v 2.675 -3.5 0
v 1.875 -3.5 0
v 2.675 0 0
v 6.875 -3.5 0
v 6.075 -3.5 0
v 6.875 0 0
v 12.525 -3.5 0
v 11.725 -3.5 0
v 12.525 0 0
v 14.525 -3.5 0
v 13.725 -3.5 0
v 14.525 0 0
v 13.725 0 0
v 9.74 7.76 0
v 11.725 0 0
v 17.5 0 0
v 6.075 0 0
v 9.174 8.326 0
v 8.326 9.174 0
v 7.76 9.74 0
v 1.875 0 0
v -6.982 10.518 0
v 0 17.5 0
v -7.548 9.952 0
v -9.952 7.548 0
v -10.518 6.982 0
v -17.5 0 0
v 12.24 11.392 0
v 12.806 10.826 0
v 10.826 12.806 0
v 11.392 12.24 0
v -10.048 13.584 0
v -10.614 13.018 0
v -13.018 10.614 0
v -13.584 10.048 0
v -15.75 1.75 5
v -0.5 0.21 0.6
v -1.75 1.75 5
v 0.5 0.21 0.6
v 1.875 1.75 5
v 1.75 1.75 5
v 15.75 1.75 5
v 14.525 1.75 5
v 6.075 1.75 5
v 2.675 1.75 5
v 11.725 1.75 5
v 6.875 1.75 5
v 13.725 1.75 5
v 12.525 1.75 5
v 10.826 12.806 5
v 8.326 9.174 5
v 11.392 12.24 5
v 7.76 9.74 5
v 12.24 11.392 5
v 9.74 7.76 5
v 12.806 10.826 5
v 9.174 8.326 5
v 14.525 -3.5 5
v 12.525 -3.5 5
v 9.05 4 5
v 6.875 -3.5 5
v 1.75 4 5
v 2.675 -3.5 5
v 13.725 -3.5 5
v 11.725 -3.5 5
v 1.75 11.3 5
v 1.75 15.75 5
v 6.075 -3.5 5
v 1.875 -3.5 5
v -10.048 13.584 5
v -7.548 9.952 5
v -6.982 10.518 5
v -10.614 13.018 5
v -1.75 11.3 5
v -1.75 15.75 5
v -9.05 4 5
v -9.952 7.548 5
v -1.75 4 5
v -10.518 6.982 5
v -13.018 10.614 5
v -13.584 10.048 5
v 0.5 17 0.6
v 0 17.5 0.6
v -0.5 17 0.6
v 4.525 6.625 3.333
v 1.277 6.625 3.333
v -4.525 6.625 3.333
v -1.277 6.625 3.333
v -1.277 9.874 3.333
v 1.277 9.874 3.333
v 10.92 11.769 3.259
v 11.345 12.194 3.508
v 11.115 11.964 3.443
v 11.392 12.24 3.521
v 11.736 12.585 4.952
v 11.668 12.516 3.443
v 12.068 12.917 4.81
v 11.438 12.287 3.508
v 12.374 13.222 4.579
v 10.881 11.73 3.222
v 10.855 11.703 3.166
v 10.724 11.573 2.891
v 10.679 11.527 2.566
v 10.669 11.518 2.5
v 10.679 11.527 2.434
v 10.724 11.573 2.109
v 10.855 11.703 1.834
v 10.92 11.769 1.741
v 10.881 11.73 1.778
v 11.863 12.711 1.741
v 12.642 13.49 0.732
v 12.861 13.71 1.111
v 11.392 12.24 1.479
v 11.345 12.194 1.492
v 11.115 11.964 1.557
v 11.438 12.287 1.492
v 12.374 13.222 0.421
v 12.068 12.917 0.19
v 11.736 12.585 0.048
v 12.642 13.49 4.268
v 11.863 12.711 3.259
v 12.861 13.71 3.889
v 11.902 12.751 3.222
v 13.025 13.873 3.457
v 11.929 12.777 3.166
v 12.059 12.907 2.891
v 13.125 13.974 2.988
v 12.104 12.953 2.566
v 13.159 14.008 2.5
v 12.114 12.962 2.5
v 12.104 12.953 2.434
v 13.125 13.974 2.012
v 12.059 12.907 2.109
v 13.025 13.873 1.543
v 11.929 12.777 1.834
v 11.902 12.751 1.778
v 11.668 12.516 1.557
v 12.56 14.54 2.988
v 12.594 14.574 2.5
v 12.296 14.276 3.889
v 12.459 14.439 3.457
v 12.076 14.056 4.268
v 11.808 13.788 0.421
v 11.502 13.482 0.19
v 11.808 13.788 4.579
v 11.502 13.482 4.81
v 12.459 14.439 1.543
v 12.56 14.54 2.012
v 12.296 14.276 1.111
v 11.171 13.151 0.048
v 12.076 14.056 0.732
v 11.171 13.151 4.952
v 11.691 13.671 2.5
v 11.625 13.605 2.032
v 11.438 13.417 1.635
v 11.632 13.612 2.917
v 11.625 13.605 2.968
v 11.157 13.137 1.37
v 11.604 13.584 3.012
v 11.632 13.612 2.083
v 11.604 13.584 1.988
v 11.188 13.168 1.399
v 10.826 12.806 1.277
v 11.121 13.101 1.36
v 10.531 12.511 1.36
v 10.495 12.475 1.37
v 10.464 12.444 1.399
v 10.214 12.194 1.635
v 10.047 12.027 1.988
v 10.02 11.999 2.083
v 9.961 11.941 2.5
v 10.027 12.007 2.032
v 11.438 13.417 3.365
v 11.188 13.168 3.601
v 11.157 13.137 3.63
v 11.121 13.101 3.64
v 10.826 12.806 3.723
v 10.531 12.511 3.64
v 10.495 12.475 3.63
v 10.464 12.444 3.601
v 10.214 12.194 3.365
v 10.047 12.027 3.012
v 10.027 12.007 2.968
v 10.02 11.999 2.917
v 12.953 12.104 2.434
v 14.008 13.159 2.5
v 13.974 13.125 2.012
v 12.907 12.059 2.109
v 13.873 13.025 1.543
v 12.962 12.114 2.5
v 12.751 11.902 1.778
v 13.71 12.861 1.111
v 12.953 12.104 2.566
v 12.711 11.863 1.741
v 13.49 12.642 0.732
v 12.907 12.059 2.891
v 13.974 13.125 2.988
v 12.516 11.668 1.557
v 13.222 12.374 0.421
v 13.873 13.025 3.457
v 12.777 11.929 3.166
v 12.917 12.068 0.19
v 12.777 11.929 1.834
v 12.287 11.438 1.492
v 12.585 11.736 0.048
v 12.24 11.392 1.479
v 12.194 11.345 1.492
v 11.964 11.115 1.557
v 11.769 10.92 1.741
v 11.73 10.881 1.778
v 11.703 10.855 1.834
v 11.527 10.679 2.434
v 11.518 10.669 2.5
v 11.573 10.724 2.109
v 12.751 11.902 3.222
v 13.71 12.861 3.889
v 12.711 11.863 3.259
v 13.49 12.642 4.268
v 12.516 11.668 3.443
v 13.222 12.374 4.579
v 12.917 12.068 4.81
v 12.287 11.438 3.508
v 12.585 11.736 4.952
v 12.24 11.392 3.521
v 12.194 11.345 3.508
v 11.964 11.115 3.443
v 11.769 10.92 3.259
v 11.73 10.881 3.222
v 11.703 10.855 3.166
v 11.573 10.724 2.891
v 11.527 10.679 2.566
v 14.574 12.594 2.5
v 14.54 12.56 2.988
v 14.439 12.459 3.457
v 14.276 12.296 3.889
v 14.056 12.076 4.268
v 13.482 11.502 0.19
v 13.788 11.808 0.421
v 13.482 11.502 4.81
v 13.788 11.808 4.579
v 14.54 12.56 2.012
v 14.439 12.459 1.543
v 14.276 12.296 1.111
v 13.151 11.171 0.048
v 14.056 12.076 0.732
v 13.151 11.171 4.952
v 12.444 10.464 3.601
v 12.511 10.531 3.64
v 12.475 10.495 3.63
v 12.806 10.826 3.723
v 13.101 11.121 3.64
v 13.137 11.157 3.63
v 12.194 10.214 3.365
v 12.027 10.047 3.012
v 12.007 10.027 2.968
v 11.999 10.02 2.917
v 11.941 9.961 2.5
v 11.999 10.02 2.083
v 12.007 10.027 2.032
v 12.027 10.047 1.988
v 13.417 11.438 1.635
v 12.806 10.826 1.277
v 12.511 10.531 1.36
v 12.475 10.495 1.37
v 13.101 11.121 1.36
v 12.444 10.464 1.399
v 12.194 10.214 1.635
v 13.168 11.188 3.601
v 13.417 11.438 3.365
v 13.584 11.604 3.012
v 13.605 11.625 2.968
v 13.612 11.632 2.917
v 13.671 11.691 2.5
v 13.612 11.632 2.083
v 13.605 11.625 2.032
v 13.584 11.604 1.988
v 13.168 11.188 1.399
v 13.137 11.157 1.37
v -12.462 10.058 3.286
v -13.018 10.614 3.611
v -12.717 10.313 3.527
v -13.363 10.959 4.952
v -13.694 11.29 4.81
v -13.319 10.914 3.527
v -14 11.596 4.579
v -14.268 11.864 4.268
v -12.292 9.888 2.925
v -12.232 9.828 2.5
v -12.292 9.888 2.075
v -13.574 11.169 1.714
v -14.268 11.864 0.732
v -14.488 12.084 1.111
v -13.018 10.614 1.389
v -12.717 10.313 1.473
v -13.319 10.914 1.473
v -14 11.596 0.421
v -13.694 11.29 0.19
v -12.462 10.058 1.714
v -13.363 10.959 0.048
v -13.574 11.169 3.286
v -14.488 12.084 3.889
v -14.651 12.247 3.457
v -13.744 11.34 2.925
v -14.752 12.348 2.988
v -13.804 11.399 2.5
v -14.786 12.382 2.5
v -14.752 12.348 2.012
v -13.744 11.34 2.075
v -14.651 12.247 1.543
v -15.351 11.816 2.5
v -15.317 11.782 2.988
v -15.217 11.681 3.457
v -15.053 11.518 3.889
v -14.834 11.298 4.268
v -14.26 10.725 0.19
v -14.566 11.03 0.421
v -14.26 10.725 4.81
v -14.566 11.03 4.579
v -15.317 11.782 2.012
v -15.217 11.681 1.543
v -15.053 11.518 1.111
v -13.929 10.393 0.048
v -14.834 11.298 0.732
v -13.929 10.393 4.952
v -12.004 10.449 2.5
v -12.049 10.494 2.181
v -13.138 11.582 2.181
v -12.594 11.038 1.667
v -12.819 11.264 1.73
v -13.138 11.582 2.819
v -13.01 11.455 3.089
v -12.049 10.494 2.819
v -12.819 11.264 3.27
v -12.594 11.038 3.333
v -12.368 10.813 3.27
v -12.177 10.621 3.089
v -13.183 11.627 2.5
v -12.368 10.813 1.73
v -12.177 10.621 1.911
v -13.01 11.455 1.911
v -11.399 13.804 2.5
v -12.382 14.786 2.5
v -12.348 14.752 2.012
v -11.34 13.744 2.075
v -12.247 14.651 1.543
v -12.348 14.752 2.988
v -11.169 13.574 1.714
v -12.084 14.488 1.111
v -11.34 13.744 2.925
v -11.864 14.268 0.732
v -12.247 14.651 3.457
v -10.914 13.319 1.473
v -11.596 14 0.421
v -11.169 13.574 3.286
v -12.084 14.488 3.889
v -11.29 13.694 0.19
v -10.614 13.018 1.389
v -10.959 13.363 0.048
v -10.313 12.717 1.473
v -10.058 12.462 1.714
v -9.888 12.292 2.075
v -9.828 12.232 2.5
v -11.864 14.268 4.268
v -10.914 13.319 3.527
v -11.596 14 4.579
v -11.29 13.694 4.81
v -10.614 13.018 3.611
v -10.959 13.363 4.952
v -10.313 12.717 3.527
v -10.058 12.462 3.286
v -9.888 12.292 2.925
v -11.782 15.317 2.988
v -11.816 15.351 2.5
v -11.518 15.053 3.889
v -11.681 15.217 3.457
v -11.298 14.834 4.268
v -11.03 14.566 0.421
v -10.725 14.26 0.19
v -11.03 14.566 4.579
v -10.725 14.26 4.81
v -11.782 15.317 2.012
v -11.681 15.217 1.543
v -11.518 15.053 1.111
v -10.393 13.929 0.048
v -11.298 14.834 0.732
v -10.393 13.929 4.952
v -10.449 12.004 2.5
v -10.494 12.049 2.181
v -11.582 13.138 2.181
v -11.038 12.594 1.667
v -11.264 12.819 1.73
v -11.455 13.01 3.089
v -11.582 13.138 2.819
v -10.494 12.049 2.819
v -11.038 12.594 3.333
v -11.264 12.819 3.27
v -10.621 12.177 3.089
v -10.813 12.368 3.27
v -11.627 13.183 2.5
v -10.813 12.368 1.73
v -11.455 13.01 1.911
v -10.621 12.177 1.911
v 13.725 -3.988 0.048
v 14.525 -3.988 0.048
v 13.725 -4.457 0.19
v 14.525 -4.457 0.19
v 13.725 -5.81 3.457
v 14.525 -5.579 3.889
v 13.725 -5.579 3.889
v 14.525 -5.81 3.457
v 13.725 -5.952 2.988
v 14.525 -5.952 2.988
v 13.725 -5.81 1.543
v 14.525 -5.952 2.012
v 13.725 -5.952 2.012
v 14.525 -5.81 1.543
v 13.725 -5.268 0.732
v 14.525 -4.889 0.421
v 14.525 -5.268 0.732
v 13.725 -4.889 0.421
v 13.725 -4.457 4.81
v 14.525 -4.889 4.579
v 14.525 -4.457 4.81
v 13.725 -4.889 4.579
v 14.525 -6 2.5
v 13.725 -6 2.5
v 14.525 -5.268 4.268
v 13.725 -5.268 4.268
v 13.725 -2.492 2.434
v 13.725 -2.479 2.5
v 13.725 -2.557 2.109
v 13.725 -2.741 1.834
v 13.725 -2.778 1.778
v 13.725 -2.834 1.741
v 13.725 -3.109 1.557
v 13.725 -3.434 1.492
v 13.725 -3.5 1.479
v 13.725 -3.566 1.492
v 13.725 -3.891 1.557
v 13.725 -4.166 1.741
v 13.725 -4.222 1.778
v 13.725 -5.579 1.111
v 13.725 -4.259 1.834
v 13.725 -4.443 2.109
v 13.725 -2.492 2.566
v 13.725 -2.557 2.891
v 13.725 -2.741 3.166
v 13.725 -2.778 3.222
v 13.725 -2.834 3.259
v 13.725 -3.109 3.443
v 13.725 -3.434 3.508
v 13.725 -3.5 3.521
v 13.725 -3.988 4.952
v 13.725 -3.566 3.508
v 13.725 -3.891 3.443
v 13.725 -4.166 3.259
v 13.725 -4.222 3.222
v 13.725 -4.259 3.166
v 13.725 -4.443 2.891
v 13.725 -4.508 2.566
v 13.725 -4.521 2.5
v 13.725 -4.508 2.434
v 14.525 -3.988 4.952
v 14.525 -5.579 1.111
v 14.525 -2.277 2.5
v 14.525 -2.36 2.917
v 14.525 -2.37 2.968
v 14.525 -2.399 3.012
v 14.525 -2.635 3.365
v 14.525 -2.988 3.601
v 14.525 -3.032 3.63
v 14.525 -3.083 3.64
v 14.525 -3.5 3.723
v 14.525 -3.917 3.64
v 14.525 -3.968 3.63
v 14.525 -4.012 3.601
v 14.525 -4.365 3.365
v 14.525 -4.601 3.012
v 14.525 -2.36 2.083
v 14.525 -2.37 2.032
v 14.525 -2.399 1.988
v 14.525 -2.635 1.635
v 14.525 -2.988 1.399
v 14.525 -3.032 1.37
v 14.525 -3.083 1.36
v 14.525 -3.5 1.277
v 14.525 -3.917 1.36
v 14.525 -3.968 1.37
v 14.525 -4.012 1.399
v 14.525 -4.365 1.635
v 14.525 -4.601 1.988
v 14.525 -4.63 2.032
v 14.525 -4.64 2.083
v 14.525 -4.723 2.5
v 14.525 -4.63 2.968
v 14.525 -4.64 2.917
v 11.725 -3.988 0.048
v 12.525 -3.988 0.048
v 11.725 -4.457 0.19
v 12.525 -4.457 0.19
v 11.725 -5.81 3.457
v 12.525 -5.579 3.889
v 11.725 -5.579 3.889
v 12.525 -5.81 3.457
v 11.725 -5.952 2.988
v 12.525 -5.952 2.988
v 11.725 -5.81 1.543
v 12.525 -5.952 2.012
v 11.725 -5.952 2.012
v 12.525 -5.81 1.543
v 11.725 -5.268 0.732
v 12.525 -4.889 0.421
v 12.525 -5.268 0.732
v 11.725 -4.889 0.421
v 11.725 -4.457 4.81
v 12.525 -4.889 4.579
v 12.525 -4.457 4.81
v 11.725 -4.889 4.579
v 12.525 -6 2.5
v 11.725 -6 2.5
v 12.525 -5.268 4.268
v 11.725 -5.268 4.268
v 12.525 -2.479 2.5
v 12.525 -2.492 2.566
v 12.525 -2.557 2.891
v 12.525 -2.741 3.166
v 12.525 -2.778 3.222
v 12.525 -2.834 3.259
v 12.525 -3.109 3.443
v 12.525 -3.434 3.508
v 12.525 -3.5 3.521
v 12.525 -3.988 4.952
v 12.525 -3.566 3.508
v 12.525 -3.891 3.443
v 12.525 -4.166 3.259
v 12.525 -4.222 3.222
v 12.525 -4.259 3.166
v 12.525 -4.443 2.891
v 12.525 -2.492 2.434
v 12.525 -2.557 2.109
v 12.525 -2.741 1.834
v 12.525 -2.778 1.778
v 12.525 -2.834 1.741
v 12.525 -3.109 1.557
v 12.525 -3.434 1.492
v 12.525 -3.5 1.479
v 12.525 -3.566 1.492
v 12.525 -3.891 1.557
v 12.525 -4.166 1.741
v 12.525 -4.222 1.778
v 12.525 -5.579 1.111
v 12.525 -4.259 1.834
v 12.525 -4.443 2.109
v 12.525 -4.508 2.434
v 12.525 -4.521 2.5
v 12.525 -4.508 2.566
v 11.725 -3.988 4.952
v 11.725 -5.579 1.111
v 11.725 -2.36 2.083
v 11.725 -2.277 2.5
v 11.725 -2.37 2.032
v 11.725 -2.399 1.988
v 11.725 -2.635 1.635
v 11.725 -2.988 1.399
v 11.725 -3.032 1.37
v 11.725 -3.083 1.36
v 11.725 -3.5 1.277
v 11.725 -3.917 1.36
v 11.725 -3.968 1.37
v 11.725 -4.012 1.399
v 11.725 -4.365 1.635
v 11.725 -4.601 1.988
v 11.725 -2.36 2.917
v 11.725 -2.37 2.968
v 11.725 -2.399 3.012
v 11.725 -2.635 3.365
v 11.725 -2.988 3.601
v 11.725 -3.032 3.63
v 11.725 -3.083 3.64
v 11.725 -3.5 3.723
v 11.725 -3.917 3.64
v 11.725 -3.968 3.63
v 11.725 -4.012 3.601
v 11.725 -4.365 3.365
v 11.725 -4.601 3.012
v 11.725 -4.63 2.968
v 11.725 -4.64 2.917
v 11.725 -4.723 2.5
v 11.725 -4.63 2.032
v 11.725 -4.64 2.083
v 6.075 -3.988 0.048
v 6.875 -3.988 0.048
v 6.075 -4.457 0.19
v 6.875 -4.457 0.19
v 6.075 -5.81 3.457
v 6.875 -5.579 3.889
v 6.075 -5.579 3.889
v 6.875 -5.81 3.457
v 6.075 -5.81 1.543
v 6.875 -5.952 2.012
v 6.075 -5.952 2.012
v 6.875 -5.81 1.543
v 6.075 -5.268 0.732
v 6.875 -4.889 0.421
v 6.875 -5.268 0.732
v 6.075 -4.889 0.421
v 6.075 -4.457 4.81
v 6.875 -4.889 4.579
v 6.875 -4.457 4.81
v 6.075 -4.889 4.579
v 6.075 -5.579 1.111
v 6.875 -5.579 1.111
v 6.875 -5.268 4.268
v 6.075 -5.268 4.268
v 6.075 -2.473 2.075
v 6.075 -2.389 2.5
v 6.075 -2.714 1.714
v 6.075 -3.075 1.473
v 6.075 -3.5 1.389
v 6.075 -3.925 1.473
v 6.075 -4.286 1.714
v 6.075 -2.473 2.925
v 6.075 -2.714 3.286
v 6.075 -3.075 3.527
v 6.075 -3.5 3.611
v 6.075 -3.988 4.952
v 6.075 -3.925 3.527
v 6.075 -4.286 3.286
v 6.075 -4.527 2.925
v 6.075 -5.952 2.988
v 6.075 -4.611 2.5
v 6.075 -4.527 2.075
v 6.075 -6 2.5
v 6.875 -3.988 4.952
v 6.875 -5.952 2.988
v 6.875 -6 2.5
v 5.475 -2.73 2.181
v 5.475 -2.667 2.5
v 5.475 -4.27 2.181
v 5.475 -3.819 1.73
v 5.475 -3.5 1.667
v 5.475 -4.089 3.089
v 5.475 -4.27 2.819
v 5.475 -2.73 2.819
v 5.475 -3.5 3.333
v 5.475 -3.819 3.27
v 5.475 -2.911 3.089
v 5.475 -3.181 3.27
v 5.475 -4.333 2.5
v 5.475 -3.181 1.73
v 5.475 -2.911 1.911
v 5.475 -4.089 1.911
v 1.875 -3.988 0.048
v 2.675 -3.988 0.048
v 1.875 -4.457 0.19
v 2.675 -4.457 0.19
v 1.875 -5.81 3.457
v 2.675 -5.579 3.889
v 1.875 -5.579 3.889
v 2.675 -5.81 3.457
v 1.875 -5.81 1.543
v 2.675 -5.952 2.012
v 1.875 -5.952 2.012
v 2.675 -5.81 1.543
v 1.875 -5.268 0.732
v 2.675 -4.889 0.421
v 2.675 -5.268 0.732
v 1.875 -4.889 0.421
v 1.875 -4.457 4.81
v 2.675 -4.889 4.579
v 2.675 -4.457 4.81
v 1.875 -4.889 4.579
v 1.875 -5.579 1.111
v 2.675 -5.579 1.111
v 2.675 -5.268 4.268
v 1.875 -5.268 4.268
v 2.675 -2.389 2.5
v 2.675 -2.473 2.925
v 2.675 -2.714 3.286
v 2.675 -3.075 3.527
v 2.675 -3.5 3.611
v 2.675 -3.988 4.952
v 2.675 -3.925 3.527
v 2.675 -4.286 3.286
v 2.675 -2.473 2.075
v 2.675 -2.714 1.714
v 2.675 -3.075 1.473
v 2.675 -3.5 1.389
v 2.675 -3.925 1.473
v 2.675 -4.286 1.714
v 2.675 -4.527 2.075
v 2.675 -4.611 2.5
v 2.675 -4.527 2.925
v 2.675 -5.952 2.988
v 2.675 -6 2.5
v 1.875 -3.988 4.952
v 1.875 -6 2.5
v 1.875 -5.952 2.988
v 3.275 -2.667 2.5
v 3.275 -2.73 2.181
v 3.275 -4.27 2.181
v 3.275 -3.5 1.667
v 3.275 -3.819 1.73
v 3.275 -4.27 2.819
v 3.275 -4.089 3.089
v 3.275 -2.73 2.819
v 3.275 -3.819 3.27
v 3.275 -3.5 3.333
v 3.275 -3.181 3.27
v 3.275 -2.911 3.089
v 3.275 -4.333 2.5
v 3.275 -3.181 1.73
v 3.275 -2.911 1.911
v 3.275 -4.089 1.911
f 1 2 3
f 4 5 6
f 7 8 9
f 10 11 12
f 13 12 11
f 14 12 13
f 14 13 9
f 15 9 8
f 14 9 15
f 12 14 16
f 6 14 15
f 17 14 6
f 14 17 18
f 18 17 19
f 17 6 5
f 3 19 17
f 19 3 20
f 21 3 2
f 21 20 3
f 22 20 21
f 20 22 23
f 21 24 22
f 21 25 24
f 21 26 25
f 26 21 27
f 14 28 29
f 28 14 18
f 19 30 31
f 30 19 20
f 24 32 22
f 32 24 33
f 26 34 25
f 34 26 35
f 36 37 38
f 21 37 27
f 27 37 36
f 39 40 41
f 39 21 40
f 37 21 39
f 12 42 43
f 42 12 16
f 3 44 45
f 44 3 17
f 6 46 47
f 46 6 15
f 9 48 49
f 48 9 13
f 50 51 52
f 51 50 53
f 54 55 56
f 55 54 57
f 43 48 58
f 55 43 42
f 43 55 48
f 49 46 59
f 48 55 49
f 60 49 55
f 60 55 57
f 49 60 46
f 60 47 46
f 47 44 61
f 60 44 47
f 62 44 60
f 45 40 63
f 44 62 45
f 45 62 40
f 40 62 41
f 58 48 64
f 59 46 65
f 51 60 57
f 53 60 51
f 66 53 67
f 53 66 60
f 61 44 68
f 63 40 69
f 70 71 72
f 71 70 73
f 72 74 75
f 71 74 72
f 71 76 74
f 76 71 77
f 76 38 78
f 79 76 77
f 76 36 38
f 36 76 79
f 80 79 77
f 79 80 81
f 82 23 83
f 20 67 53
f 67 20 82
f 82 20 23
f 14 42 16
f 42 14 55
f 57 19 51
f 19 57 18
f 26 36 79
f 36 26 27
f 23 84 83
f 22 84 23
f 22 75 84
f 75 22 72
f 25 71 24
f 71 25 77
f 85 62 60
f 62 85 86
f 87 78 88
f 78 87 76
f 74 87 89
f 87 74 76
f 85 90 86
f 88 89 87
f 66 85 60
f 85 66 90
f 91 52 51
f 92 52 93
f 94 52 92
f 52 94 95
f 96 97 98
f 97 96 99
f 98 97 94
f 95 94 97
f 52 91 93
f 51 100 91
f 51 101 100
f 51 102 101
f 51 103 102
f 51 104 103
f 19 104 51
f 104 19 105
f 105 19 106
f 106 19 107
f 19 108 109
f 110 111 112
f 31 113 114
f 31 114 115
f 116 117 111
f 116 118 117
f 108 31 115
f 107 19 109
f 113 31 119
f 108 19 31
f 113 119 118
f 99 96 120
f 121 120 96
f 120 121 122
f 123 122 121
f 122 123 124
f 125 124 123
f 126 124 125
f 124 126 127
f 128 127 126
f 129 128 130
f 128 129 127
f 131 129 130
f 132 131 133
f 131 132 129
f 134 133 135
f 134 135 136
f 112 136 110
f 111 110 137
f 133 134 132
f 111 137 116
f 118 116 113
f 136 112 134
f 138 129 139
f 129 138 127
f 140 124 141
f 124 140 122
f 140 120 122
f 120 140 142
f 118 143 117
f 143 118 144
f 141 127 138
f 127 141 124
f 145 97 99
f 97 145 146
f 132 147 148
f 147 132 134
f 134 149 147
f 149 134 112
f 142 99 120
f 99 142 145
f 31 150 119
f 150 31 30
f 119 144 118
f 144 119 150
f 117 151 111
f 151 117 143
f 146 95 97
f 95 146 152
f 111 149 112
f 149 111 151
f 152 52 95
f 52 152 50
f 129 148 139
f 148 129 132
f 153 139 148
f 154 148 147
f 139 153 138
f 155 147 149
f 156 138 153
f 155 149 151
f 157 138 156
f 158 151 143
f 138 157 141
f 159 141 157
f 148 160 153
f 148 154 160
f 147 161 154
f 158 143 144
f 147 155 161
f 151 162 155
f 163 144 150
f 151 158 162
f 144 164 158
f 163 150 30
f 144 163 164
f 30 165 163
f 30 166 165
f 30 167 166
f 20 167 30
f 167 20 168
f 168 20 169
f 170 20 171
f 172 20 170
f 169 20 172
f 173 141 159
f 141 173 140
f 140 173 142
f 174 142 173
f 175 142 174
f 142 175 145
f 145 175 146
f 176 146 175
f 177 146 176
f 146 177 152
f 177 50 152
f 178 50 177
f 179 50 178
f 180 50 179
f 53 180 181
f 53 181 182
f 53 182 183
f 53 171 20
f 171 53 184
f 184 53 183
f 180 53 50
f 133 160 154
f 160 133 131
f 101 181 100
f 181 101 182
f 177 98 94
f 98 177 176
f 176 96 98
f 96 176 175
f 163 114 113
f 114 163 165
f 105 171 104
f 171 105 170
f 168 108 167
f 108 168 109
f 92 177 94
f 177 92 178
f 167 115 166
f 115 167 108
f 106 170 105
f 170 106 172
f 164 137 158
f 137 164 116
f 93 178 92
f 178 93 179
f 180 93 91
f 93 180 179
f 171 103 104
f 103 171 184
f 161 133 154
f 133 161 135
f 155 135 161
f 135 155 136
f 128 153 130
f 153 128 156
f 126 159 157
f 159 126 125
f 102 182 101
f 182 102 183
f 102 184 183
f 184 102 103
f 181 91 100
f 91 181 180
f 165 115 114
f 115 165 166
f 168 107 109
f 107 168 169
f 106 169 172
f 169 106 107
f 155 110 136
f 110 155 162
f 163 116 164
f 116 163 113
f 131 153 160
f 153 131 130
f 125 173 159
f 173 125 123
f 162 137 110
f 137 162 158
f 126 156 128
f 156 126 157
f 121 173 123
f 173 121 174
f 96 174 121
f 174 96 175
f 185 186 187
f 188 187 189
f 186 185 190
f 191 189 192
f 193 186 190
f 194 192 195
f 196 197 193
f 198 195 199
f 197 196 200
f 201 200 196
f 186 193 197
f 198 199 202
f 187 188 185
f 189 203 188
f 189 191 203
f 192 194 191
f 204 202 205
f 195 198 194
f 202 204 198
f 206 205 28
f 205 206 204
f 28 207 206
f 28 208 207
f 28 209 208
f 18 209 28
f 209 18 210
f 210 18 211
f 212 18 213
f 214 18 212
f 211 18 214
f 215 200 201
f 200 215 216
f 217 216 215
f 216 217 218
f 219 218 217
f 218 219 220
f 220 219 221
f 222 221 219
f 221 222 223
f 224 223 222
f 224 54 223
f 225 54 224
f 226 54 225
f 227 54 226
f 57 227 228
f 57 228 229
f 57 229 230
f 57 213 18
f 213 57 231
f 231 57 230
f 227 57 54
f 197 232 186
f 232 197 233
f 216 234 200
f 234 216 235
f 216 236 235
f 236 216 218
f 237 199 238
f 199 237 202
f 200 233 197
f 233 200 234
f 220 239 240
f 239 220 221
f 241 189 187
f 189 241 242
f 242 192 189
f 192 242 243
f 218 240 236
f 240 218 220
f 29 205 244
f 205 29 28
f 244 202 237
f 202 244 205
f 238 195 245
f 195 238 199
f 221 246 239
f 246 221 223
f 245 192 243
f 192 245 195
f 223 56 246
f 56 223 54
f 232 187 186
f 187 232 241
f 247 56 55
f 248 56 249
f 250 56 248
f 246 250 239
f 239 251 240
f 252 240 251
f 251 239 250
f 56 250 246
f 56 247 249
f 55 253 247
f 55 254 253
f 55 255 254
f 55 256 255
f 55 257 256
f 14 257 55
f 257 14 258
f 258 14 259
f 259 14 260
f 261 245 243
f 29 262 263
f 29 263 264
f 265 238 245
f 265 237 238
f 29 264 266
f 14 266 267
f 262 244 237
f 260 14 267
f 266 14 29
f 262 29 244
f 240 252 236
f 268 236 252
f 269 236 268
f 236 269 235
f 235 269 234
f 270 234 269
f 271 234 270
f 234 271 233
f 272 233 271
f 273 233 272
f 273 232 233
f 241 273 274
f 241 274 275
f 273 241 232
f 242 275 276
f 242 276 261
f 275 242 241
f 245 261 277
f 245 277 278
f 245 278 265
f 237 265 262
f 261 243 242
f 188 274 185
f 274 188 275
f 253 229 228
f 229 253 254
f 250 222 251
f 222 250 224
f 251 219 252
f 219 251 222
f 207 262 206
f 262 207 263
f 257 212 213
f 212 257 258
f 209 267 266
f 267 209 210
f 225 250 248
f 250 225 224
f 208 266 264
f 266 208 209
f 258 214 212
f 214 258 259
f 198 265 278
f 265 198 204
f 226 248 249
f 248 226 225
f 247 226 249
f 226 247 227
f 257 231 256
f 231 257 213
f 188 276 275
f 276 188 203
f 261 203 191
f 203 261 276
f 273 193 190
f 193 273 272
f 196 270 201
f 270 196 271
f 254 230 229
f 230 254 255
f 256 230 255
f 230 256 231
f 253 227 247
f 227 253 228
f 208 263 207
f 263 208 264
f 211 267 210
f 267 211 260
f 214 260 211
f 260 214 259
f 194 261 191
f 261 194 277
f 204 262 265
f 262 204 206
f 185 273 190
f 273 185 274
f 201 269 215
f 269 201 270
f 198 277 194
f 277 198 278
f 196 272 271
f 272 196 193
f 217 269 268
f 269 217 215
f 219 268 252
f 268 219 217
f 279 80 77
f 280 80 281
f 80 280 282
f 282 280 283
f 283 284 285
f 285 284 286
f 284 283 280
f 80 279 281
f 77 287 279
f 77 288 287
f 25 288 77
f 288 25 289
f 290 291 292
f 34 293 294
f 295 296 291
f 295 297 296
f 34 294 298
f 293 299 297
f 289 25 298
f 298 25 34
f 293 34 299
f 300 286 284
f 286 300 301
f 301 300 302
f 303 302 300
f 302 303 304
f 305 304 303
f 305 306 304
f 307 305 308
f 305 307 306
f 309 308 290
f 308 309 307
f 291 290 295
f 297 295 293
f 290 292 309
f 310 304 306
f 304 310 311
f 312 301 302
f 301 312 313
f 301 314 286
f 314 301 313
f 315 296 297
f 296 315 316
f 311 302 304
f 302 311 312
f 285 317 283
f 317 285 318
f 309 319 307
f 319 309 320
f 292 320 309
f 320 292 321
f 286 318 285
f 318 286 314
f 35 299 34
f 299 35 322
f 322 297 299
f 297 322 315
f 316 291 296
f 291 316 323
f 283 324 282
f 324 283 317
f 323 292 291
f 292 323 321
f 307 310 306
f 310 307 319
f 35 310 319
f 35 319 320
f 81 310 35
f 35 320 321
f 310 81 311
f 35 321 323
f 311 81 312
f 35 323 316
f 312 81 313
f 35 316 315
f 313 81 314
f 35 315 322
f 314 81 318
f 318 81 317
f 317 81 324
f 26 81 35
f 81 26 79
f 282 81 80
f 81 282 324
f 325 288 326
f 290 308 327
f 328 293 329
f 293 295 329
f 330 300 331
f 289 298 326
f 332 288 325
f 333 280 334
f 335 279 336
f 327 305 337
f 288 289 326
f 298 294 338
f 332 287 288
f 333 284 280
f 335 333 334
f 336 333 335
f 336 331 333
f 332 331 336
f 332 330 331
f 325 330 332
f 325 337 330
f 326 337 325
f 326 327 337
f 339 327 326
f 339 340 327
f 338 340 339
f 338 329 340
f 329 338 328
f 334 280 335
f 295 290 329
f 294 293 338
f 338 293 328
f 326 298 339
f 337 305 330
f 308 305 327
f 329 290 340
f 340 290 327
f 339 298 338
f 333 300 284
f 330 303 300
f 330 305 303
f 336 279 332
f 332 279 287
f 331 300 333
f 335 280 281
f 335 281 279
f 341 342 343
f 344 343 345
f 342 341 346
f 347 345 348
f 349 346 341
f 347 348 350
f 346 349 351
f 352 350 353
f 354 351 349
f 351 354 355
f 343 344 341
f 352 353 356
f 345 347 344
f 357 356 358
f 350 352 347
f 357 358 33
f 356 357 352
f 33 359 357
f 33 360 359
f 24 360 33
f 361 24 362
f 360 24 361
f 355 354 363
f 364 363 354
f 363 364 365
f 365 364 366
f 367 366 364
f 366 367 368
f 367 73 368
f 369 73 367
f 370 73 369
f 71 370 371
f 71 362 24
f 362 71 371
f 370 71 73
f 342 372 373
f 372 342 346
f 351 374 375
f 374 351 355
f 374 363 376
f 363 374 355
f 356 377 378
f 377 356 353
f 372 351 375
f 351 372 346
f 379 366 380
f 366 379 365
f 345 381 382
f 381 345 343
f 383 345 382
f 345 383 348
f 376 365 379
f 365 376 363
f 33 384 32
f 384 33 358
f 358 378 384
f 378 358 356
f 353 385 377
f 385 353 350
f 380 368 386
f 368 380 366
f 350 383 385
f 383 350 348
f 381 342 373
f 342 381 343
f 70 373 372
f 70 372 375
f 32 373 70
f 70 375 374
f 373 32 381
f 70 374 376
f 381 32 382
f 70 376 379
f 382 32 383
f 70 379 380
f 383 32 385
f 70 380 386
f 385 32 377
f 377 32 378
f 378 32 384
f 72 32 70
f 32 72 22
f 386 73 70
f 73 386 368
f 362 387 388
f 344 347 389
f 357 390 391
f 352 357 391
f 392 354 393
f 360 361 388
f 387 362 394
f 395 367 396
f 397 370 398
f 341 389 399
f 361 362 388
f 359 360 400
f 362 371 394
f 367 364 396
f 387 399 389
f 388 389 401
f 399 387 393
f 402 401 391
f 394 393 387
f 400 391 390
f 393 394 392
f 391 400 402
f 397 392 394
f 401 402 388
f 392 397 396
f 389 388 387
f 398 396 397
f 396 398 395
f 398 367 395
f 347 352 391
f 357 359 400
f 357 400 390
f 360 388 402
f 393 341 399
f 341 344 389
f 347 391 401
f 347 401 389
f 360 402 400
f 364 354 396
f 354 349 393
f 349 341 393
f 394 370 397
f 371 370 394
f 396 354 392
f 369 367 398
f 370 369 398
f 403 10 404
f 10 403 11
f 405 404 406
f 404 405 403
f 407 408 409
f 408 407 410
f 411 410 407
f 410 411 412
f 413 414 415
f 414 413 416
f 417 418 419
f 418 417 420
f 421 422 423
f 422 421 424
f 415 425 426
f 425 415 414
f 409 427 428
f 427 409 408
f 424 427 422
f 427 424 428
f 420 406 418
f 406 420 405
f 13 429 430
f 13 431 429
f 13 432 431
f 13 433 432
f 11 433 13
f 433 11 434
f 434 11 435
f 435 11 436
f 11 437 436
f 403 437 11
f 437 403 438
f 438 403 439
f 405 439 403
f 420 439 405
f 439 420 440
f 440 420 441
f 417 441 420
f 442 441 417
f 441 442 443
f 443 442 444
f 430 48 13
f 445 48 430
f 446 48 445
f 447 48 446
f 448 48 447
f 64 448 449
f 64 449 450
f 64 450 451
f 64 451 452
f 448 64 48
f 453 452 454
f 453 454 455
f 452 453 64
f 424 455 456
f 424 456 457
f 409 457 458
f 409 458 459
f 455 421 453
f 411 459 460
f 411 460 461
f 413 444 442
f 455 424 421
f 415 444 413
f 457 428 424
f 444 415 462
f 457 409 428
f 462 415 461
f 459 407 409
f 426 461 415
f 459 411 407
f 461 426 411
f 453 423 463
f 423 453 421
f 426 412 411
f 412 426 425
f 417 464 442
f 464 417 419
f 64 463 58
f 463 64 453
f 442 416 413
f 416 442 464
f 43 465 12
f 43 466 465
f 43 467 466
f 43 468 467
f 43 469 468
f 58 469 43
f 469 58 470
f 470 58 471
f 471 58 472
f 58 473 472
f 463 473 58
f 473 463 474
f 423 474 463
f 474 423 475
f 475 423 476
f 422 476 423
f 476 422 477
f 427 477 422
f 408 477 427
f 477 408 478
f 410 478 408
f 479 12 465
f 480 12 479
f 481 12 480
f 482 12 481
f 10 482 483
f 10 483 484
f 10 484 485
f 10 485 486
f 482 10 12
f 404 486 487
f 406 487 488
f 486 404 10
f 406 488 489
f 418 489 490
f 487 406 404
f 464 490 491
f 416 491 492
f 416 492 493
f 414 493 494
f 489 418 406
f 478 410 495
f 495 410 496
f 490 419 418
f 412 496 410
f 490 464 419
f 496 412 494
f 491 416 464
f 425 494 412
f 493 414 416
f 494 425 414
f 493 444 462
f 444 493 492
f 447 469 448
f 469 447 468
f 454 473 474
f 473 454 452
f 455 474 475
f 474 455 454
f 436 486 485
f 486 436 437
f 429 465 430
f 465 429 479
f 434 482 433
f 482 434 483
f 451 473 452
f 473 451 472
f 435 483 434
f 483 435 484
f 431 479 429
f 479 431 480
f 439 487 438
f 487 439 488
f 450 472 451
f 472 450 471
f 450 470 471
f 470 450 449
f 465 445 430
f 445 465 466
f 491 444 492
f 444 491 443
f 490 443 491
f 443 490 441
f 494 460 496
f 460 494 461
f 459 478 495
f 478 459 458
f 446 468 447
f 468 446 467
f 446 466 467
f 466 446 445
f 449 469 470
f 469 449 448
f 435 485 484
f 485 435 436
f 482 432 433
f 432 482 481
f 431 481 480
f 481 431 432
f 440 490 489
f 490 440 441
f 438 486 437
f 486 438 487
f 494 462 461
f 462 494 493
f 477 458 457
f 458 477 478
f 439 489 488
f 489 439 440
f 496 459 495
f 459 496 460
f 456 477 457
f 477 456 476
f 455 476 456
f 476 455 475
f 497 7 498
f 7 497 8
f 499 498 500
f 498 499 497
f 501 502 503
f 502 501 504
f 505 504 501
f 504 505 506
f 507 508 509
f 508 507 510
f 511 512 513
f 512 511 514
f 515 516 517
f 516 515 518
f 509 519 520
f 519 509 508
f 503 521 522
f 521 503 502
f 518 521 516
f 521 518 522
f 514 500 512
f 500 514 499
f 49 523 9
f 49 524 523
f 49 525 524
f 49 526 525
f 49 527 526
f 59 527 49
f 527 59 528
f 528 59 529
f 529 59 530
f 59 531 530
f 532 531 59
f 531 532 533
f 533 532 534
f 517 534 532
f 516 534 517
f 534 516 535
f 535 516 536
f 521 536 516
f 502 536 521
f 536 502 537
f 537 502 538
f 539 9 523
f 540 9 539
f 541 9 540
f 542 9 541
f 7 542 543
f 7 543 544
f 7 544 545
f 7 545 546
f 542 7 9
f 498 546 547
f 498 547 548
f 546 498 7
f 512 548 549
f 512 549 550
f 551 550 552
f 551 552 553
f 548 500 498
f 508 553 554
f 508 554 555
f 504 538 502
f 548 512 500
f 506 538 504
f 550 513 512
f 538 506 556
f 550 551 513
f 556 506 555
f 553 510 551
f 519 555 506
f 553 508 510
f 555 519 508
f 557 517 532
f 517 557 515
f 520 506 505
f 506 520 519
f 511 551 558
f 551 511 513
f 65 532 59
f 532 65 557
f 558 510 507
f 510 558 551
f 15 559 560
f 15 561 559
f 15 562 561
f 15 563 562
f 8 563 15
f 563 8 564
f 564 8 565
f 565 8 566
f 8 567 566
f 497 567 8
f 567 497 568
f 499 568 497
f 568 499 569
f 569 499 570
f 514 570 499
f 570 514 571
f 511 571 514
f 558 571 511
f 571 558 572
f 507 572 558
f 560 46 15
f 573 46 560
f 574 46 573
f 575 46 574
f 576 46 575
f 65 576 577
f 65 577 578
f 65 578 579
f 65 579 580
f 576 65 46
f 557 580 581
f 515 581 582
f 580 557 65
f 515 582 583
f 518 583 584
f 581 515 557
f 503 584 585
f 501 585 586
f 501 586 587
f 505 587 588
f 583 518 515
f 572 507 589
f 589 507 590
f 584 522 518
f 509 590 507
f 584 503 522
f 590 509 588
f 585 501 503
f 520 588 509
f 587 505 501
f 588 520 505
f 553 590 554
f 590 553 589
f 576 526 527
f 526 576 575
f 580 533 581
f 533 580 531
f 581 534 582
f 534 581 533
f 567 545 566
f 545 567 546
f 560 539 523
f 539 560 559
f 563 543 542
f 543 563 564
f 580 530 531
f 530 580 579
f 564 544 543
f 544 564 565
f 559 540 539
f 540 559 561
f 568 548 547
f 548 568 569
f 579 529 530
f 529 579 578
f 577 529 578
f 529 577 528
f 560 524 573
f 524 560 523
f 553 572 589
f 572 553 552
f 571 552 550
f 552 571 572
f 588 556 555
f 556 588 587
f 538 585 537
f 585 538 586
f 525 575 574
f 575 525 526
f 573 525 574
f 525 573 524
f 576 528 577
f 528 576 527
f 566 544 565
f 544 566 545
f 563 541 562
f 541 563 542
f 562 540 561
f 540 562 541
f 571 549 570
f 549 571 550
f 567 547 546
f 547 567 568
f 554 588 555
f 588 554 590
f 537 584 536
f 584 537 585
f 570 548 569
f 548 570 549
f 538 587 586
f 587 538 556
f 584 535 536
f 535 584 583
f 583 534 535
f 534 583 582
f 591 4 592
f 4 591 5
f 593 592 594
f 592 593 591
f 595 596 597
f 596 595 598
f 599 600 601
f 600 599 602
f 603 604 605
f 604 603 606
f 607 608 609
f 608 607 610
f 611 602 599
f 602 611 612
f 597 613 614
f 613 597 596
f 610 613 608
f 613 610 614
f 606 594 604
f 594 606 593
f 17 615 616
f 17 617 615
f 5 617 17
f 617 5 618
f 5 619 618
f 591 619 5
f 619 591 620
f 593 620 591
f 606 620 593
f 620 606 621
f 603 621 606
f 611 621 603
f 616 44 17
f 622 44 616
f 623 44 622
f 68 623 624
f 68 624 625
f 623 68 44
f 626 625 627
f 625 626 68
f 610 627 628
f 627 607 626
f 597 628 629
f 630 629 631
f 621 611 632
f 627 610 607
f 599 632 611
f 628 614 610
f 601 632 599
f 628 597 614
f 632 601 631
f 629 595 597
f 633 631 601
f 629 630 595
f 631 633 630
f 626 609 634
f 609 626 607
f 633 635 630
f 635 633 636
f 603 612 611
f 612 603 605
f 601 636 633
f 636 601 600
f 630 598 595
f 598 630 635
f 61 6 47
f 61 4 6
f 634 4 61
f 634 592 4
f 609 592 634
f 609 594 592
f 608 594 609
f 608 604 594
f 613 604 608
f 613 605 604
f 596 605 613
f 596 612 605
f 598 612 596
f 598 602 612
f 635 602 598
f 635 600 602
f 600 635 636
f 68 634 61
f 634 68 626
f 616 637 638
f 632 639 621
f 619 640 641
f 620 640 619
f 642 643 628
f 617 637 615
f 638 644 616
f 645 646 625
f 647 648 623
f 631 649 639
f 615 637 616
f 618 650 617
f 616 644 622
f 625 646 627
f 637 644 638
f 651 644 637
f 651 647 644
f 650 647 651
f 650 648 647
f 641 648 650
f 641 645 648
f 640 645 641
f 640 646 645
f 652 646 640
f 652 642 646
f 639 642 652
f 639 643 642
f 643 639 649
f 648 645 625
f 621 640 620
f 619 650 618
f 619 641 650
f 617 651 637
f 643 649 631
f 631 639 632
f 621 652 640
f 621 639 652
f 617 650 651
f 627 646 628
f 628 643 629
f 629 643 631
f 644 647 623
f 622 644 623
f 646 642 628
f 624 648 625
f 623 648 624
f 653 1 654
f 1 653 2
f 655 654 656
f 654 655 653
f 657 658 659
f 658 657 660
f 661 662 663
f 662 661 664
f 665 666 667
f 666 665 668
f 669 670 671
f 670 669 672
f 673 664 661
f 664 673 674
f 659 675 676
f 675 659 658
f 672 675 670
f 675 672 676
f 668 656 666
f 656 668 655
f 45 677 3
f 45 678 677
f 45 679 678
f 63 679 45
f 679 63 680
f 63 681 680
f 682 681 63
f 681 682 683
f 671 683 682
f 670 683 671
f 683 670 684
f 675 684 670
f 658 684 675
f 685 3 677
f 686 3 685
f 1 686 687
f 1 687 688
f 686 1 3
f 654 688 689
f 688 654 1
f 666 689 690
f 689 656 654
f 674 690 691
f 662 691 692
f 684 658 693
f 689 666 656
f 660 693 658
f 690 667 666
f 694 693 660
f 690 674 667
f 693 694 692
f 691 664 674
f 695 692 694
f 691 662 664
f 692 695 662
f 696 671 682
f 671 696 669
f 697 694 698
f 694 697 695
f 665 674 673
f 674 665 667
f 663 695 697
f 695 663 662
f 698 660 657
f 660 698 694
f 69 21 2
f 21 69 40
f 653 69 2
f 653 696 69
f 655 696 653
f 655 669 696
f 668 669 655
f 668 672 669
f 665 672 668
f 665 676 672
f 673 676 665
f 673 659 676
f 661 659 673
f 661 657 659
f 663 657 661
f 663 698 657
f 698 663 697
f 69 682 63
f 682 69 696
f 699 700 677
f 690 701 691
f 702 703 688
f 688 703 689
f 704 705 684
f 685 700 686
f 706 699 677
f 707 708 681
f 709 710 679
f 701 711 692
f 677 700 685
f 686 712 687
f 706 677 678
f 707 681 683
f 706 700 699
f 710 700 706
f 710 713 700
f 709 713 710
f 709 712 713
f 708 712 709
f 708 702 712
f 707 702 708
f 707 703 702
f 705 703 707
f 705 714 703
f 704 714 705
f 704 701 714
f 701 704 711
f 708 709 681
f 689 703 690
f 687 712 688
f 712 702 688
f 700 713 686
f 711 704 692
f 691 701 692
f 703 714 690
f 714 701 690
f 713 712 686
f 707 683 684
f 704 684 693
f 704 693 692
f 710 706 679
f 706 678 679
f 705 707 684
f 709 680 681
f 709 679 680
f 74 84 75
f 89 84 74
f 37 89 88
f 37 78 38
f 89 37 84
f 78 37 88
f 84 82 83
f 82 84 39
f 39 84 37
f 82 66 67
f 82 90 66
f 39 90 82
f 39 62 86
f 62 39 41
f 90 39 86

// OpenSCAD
// file: ../common/joint-v2/wall.scad
include <../helpers/getValue.scad>

module joint_wall_side(
    SIZE,
    CORNER_RADIUS,
    fn = 32
) {
    SIZE_X = getValue(SIZE[0], 1);
    SIZE_Y = getValue(SIZE[1], 5);
    SIZE_Z = getValue(SIZE[2], 5);
    _CR = getValue(CORNER_RADIUS, SIZE_Z / 4);
    if (_CR == 0) {
        cube([SIZE_X, SIZE_Y, SIZE_Z]);
    } else {
        hull() {
            cube([SIZE_X, 1, SIZE_Z]);

            translate([0, SIZE_Y - _CR , 0]) {
                translate([0, 0, _CR])
                    rotate([0, 90, 0])
                        cylinder(r=_CR, h=SIZE_X, $fn=fn);

                translate([0, 0, SIZE_Z - _CR])
                    rotate([0, 90, 0])
                        cylinder(r=_CR, h=SIZE_X, $fn=fn);
            }
        }
    }
}
// file: ../common/helpers/getValue.scad
function getValue(variable, default) = variable == undef ? default : variable;
// file: ../common/joint-v2/chain.scad
include <../helpers/getValue.scad>

_CHAIN_DEFAULT_X = 1;
_CHAIN_DEFAULT_Y = 5;
_CHAIN_DEFAULT_Z = 5;

_CHAIN_DEFAULT_TOLERANCE = 0.3;

_CHAIN_DEFALLT_TYPE = "male";

module chain_joint_side(TYPE = _CHAIN_DEFALLT_TYPE, SIZE, CORNER_RADIUS, R, R2_KOEF, H, TOLERANCE = _CHAIN_DEFAULT_TOLERANCE) {
    SIZE_X = getValue(SIZE[0], _CHAIN_DEFAULT_X);
    SIZE_Y = getValue(SIZE[1], _CHAIN_DEFAULT_Y);
    SIZE_Z = getValue(SIZE[2], _CHAIN_DEFAULT_Z);

    include <./wall.scad>

    _CR1 = getValue(R, SIZE_Z / 4);
    _CR2 = getValue(R2_KOEF, 0.75) * _CR1;
    _CH = getValue(H, SIZE_X * 0.75);

    DIFF = SIZE_Z / 2 - _CR1;

    if (TYPE == "male") {
        union() {
            joint_wall_side(SIZE, CORNER_RADIUS);

            translate([SIZE_X, SIZE_Y - _CR1 - DIFF, SIZE_Z / 2])
                rotate([0, 90, 0])
                    cylinder(r1=_CR1, r2=_CR2, h=_CH, $fn = 16);
        }
    } else {
        difference() {
            joint_wall_side(SIZE, CORNER_RADIUS);

            translate([SIZE_X + TOLERANCE / 2, SIZE_Y - _CR1 - DIFF, SIZE_Z / 2])
                rotate([0, 270, 0])
                    cylinder(r2=_CR1 + TOLERANCE / 2, r1=_CR2 + TOLERANCE / 2, h=SIZE_X + TOLERANCE, $fn = 16);
        }
    }
}

module chain_joint(TYPE = _CHAIN_DEFALLT_TYPE, SIZE, CORNER_RADIUS, WALL_THICKNESS = _CHAIN_DEFAULT_X, R, R2_KOEF, H, TOLERANCE = _CHAIN_DEFAULT_TOLERANCE) {
    SIZE_X = getValue(SIZE[0], _CHAIN_DEFAULT_X);
    SIZE_Y = getValue(SIZE[1], _CHAIN_DEFAULT_Y);
    SIZE_Z = getValue(SIZE[2], _CHAIN_DEFAULT_Z);

    SIDE_SIZE = [WALL_THICKNESS, SIZE_Y, SIZE_Z];

    MOVE_X = TYPE == "male" ? 0 : WALL_THICKNESS + TOLERANCE;

    translate([MOVE_X, 0, 0]) chain_joint_side(TYPE, SIDE_SIZE, CORNER_RADIUS, R, R2_KOEF, H, TOLERANCE);
    translate([SIZE_X - MOVE_X, 0, 0])
        mirror([1, 0, 0]) chain_joint_side(TYPE, SIDE_SIZE, CORNER_RADIUS, R, R2_KOEF, H, TOLERANCE);
}
// main file
TRIANGLE_WIDTH = 35;
TRIANGLE_THICKNESS = 5;

FLEX_JOINT_WIDTH = 1;
FLEX_JOINT_HEIGHT = 0.6;

/** DO NOT EDIT FOLLOWING VARS **/

JOINT_SIZE_X = 5;
JOINT_SIZE_Y = 8.25;
JOINT_SIZE_Y_2 = 8;
JOINT_SIZE_Z = TRIANGLE_THICKNESS;
JOINT_WALL_THICKNESS = 0.8;
JOINT_R = JOINT_SIZE_Z / 4.5;
JOINT_CORNER_RADIUS = JOINT_SIZE_Z / 2;

module joint_m(SY = JOINT_SIZE_Y) {
    _SIZE = [JOINT_SIZE_X, SY, JOINT_SIZE_Z];
    translate([0 - JOINT_SIZE_X / 2, 0, 0]) chain_joint(TYPE="male", SIZE=_SIZE, WALL_THICKNESS=JOINT_WALL_THICKNESS, CORNER_RADIUS = JOINT_CORNER_RADIUS, R = JOINT_R);
}

module joint_f(SY = JOINT_SIZE_Y) {
    _SIZE = [JOINT_SIZE_X, SY, JOINT_SIZE_Z];
    translate([0 - JOINT_SIZE_X / 2, 0, 0]) chain_joint(TYPE="female", SIZE=_SIZE, WALL_THICKNESS=JOINT_WALL_THICKNESS, CORNER_RADIUS = JOINT_CORNER_RADIUS, R = JOINT_R);
}

include <./../common/joint-v2/chain.scad>

module triangle_base(OFFSET = 0) {
    X1 = 0 - TRIANGLE_WIDTH / 2;
    X2 = 0;
    X3 = TRIANGLE_WIDTH / 2;

    Y1 = 0;
    Y2 = TRIANGLE_WIDTH / 2;
    Y3 = 0;
    offset(delta = 0 - OFFSET) {
        polygon([[X1, Y1], [X2, Y2], [X3, Y3]]);
    }
}

module triangle(SCALE = 1) {
    translate([0, TRIANGLE_WIDTH / 2, 0])
        linear_extrude(height = TRIANGLE_THICKNESS, scale=SCALE)
            translate([0, 0 - TRIANGLE_WIDTH / 2, 0])
                triangle_base();
}

module joint_extension(WIDTH = 1) {
    difference() {
        rotate(180, [0, 0, 1])
            translate([0, 0, 0])
                cube([WIDTH, JOINT_WIDTH / 2, JOINT_HEIGHT]);
        translate([1, 0 - JOINT_WIDTH / 2, 0])
            rotate(-45, [1, 0, 0])
                rotate(180, [0, 0, 1])
                    cube([JOINT_WIDTH + 2, TRIANGLE_WIDTH / 4, JOINT_HEIGHT]);
    }
}

module cutout() {
    translate([0, 0.5, 0])
        mirror([0, 0, 1])
            linear_extrude(height = TRIANGLE_THICKNESS / 3, scale = 0.5)
                translate([0, 0 - TRIANGLE_WIDTH / 4, 0])
                    triangle_base(3.5);
}

module base() {
    difference() {
        triangle(0.9);
        translate([0, TRIANGLE_WIDTH / 4, TRIANGLE_THICKNESS])
            cutout();
    }
}

module base_model() {
    union() {
        base();

        translate([TRIANGLE_WIDTH / 4 - 1, TRIANGLE_WIDTH / 4 - 1, 0])
          rotate(-45, [0, 0, 1])
            joint_f();

        translate([0 - TRIANGLE_WIDTH / 4 + 1, TRIANGLE_WIDTH / 4 - 1, 0])
          rotate(45, [0, 0, 1])
            joint_m();

        translate([TRIANGLE_WIDTH / 2, 0, 0]) {
            translate([0, 0, 0]) {
                rotate([0, 0, 180]) {
                    translate([TRIANGLE_WIDTH / 8, 0 - 2, 0]) {
                        joint_f(JOINT_SIZE_Y_2);
                        translate([TRIANGLE_WIDTH / 4, 0, 0])
                            joint_m(JOINT_SIZE_Y_2);
                    }
                }
            }
        }
    }
}

module assembly() {
    FLEX_H = TRIANGLE_THICKNESS - FLEX_JOINT_HEIGHT;
    difference() {
        base_model();
        translate([0, 0, FLEX_JOINT_HEIGHT])
            linear_extrude(height = FLEX_H, scale = [3.5, 1])
                translate([0 - FLEX_JOINT_WIDTH / 2, 0, 0])
                    square([FLEX_JOINT_WIDTH, TRIANGLE_WIDTH]);
    }
}

assembly();
/* base(); */
